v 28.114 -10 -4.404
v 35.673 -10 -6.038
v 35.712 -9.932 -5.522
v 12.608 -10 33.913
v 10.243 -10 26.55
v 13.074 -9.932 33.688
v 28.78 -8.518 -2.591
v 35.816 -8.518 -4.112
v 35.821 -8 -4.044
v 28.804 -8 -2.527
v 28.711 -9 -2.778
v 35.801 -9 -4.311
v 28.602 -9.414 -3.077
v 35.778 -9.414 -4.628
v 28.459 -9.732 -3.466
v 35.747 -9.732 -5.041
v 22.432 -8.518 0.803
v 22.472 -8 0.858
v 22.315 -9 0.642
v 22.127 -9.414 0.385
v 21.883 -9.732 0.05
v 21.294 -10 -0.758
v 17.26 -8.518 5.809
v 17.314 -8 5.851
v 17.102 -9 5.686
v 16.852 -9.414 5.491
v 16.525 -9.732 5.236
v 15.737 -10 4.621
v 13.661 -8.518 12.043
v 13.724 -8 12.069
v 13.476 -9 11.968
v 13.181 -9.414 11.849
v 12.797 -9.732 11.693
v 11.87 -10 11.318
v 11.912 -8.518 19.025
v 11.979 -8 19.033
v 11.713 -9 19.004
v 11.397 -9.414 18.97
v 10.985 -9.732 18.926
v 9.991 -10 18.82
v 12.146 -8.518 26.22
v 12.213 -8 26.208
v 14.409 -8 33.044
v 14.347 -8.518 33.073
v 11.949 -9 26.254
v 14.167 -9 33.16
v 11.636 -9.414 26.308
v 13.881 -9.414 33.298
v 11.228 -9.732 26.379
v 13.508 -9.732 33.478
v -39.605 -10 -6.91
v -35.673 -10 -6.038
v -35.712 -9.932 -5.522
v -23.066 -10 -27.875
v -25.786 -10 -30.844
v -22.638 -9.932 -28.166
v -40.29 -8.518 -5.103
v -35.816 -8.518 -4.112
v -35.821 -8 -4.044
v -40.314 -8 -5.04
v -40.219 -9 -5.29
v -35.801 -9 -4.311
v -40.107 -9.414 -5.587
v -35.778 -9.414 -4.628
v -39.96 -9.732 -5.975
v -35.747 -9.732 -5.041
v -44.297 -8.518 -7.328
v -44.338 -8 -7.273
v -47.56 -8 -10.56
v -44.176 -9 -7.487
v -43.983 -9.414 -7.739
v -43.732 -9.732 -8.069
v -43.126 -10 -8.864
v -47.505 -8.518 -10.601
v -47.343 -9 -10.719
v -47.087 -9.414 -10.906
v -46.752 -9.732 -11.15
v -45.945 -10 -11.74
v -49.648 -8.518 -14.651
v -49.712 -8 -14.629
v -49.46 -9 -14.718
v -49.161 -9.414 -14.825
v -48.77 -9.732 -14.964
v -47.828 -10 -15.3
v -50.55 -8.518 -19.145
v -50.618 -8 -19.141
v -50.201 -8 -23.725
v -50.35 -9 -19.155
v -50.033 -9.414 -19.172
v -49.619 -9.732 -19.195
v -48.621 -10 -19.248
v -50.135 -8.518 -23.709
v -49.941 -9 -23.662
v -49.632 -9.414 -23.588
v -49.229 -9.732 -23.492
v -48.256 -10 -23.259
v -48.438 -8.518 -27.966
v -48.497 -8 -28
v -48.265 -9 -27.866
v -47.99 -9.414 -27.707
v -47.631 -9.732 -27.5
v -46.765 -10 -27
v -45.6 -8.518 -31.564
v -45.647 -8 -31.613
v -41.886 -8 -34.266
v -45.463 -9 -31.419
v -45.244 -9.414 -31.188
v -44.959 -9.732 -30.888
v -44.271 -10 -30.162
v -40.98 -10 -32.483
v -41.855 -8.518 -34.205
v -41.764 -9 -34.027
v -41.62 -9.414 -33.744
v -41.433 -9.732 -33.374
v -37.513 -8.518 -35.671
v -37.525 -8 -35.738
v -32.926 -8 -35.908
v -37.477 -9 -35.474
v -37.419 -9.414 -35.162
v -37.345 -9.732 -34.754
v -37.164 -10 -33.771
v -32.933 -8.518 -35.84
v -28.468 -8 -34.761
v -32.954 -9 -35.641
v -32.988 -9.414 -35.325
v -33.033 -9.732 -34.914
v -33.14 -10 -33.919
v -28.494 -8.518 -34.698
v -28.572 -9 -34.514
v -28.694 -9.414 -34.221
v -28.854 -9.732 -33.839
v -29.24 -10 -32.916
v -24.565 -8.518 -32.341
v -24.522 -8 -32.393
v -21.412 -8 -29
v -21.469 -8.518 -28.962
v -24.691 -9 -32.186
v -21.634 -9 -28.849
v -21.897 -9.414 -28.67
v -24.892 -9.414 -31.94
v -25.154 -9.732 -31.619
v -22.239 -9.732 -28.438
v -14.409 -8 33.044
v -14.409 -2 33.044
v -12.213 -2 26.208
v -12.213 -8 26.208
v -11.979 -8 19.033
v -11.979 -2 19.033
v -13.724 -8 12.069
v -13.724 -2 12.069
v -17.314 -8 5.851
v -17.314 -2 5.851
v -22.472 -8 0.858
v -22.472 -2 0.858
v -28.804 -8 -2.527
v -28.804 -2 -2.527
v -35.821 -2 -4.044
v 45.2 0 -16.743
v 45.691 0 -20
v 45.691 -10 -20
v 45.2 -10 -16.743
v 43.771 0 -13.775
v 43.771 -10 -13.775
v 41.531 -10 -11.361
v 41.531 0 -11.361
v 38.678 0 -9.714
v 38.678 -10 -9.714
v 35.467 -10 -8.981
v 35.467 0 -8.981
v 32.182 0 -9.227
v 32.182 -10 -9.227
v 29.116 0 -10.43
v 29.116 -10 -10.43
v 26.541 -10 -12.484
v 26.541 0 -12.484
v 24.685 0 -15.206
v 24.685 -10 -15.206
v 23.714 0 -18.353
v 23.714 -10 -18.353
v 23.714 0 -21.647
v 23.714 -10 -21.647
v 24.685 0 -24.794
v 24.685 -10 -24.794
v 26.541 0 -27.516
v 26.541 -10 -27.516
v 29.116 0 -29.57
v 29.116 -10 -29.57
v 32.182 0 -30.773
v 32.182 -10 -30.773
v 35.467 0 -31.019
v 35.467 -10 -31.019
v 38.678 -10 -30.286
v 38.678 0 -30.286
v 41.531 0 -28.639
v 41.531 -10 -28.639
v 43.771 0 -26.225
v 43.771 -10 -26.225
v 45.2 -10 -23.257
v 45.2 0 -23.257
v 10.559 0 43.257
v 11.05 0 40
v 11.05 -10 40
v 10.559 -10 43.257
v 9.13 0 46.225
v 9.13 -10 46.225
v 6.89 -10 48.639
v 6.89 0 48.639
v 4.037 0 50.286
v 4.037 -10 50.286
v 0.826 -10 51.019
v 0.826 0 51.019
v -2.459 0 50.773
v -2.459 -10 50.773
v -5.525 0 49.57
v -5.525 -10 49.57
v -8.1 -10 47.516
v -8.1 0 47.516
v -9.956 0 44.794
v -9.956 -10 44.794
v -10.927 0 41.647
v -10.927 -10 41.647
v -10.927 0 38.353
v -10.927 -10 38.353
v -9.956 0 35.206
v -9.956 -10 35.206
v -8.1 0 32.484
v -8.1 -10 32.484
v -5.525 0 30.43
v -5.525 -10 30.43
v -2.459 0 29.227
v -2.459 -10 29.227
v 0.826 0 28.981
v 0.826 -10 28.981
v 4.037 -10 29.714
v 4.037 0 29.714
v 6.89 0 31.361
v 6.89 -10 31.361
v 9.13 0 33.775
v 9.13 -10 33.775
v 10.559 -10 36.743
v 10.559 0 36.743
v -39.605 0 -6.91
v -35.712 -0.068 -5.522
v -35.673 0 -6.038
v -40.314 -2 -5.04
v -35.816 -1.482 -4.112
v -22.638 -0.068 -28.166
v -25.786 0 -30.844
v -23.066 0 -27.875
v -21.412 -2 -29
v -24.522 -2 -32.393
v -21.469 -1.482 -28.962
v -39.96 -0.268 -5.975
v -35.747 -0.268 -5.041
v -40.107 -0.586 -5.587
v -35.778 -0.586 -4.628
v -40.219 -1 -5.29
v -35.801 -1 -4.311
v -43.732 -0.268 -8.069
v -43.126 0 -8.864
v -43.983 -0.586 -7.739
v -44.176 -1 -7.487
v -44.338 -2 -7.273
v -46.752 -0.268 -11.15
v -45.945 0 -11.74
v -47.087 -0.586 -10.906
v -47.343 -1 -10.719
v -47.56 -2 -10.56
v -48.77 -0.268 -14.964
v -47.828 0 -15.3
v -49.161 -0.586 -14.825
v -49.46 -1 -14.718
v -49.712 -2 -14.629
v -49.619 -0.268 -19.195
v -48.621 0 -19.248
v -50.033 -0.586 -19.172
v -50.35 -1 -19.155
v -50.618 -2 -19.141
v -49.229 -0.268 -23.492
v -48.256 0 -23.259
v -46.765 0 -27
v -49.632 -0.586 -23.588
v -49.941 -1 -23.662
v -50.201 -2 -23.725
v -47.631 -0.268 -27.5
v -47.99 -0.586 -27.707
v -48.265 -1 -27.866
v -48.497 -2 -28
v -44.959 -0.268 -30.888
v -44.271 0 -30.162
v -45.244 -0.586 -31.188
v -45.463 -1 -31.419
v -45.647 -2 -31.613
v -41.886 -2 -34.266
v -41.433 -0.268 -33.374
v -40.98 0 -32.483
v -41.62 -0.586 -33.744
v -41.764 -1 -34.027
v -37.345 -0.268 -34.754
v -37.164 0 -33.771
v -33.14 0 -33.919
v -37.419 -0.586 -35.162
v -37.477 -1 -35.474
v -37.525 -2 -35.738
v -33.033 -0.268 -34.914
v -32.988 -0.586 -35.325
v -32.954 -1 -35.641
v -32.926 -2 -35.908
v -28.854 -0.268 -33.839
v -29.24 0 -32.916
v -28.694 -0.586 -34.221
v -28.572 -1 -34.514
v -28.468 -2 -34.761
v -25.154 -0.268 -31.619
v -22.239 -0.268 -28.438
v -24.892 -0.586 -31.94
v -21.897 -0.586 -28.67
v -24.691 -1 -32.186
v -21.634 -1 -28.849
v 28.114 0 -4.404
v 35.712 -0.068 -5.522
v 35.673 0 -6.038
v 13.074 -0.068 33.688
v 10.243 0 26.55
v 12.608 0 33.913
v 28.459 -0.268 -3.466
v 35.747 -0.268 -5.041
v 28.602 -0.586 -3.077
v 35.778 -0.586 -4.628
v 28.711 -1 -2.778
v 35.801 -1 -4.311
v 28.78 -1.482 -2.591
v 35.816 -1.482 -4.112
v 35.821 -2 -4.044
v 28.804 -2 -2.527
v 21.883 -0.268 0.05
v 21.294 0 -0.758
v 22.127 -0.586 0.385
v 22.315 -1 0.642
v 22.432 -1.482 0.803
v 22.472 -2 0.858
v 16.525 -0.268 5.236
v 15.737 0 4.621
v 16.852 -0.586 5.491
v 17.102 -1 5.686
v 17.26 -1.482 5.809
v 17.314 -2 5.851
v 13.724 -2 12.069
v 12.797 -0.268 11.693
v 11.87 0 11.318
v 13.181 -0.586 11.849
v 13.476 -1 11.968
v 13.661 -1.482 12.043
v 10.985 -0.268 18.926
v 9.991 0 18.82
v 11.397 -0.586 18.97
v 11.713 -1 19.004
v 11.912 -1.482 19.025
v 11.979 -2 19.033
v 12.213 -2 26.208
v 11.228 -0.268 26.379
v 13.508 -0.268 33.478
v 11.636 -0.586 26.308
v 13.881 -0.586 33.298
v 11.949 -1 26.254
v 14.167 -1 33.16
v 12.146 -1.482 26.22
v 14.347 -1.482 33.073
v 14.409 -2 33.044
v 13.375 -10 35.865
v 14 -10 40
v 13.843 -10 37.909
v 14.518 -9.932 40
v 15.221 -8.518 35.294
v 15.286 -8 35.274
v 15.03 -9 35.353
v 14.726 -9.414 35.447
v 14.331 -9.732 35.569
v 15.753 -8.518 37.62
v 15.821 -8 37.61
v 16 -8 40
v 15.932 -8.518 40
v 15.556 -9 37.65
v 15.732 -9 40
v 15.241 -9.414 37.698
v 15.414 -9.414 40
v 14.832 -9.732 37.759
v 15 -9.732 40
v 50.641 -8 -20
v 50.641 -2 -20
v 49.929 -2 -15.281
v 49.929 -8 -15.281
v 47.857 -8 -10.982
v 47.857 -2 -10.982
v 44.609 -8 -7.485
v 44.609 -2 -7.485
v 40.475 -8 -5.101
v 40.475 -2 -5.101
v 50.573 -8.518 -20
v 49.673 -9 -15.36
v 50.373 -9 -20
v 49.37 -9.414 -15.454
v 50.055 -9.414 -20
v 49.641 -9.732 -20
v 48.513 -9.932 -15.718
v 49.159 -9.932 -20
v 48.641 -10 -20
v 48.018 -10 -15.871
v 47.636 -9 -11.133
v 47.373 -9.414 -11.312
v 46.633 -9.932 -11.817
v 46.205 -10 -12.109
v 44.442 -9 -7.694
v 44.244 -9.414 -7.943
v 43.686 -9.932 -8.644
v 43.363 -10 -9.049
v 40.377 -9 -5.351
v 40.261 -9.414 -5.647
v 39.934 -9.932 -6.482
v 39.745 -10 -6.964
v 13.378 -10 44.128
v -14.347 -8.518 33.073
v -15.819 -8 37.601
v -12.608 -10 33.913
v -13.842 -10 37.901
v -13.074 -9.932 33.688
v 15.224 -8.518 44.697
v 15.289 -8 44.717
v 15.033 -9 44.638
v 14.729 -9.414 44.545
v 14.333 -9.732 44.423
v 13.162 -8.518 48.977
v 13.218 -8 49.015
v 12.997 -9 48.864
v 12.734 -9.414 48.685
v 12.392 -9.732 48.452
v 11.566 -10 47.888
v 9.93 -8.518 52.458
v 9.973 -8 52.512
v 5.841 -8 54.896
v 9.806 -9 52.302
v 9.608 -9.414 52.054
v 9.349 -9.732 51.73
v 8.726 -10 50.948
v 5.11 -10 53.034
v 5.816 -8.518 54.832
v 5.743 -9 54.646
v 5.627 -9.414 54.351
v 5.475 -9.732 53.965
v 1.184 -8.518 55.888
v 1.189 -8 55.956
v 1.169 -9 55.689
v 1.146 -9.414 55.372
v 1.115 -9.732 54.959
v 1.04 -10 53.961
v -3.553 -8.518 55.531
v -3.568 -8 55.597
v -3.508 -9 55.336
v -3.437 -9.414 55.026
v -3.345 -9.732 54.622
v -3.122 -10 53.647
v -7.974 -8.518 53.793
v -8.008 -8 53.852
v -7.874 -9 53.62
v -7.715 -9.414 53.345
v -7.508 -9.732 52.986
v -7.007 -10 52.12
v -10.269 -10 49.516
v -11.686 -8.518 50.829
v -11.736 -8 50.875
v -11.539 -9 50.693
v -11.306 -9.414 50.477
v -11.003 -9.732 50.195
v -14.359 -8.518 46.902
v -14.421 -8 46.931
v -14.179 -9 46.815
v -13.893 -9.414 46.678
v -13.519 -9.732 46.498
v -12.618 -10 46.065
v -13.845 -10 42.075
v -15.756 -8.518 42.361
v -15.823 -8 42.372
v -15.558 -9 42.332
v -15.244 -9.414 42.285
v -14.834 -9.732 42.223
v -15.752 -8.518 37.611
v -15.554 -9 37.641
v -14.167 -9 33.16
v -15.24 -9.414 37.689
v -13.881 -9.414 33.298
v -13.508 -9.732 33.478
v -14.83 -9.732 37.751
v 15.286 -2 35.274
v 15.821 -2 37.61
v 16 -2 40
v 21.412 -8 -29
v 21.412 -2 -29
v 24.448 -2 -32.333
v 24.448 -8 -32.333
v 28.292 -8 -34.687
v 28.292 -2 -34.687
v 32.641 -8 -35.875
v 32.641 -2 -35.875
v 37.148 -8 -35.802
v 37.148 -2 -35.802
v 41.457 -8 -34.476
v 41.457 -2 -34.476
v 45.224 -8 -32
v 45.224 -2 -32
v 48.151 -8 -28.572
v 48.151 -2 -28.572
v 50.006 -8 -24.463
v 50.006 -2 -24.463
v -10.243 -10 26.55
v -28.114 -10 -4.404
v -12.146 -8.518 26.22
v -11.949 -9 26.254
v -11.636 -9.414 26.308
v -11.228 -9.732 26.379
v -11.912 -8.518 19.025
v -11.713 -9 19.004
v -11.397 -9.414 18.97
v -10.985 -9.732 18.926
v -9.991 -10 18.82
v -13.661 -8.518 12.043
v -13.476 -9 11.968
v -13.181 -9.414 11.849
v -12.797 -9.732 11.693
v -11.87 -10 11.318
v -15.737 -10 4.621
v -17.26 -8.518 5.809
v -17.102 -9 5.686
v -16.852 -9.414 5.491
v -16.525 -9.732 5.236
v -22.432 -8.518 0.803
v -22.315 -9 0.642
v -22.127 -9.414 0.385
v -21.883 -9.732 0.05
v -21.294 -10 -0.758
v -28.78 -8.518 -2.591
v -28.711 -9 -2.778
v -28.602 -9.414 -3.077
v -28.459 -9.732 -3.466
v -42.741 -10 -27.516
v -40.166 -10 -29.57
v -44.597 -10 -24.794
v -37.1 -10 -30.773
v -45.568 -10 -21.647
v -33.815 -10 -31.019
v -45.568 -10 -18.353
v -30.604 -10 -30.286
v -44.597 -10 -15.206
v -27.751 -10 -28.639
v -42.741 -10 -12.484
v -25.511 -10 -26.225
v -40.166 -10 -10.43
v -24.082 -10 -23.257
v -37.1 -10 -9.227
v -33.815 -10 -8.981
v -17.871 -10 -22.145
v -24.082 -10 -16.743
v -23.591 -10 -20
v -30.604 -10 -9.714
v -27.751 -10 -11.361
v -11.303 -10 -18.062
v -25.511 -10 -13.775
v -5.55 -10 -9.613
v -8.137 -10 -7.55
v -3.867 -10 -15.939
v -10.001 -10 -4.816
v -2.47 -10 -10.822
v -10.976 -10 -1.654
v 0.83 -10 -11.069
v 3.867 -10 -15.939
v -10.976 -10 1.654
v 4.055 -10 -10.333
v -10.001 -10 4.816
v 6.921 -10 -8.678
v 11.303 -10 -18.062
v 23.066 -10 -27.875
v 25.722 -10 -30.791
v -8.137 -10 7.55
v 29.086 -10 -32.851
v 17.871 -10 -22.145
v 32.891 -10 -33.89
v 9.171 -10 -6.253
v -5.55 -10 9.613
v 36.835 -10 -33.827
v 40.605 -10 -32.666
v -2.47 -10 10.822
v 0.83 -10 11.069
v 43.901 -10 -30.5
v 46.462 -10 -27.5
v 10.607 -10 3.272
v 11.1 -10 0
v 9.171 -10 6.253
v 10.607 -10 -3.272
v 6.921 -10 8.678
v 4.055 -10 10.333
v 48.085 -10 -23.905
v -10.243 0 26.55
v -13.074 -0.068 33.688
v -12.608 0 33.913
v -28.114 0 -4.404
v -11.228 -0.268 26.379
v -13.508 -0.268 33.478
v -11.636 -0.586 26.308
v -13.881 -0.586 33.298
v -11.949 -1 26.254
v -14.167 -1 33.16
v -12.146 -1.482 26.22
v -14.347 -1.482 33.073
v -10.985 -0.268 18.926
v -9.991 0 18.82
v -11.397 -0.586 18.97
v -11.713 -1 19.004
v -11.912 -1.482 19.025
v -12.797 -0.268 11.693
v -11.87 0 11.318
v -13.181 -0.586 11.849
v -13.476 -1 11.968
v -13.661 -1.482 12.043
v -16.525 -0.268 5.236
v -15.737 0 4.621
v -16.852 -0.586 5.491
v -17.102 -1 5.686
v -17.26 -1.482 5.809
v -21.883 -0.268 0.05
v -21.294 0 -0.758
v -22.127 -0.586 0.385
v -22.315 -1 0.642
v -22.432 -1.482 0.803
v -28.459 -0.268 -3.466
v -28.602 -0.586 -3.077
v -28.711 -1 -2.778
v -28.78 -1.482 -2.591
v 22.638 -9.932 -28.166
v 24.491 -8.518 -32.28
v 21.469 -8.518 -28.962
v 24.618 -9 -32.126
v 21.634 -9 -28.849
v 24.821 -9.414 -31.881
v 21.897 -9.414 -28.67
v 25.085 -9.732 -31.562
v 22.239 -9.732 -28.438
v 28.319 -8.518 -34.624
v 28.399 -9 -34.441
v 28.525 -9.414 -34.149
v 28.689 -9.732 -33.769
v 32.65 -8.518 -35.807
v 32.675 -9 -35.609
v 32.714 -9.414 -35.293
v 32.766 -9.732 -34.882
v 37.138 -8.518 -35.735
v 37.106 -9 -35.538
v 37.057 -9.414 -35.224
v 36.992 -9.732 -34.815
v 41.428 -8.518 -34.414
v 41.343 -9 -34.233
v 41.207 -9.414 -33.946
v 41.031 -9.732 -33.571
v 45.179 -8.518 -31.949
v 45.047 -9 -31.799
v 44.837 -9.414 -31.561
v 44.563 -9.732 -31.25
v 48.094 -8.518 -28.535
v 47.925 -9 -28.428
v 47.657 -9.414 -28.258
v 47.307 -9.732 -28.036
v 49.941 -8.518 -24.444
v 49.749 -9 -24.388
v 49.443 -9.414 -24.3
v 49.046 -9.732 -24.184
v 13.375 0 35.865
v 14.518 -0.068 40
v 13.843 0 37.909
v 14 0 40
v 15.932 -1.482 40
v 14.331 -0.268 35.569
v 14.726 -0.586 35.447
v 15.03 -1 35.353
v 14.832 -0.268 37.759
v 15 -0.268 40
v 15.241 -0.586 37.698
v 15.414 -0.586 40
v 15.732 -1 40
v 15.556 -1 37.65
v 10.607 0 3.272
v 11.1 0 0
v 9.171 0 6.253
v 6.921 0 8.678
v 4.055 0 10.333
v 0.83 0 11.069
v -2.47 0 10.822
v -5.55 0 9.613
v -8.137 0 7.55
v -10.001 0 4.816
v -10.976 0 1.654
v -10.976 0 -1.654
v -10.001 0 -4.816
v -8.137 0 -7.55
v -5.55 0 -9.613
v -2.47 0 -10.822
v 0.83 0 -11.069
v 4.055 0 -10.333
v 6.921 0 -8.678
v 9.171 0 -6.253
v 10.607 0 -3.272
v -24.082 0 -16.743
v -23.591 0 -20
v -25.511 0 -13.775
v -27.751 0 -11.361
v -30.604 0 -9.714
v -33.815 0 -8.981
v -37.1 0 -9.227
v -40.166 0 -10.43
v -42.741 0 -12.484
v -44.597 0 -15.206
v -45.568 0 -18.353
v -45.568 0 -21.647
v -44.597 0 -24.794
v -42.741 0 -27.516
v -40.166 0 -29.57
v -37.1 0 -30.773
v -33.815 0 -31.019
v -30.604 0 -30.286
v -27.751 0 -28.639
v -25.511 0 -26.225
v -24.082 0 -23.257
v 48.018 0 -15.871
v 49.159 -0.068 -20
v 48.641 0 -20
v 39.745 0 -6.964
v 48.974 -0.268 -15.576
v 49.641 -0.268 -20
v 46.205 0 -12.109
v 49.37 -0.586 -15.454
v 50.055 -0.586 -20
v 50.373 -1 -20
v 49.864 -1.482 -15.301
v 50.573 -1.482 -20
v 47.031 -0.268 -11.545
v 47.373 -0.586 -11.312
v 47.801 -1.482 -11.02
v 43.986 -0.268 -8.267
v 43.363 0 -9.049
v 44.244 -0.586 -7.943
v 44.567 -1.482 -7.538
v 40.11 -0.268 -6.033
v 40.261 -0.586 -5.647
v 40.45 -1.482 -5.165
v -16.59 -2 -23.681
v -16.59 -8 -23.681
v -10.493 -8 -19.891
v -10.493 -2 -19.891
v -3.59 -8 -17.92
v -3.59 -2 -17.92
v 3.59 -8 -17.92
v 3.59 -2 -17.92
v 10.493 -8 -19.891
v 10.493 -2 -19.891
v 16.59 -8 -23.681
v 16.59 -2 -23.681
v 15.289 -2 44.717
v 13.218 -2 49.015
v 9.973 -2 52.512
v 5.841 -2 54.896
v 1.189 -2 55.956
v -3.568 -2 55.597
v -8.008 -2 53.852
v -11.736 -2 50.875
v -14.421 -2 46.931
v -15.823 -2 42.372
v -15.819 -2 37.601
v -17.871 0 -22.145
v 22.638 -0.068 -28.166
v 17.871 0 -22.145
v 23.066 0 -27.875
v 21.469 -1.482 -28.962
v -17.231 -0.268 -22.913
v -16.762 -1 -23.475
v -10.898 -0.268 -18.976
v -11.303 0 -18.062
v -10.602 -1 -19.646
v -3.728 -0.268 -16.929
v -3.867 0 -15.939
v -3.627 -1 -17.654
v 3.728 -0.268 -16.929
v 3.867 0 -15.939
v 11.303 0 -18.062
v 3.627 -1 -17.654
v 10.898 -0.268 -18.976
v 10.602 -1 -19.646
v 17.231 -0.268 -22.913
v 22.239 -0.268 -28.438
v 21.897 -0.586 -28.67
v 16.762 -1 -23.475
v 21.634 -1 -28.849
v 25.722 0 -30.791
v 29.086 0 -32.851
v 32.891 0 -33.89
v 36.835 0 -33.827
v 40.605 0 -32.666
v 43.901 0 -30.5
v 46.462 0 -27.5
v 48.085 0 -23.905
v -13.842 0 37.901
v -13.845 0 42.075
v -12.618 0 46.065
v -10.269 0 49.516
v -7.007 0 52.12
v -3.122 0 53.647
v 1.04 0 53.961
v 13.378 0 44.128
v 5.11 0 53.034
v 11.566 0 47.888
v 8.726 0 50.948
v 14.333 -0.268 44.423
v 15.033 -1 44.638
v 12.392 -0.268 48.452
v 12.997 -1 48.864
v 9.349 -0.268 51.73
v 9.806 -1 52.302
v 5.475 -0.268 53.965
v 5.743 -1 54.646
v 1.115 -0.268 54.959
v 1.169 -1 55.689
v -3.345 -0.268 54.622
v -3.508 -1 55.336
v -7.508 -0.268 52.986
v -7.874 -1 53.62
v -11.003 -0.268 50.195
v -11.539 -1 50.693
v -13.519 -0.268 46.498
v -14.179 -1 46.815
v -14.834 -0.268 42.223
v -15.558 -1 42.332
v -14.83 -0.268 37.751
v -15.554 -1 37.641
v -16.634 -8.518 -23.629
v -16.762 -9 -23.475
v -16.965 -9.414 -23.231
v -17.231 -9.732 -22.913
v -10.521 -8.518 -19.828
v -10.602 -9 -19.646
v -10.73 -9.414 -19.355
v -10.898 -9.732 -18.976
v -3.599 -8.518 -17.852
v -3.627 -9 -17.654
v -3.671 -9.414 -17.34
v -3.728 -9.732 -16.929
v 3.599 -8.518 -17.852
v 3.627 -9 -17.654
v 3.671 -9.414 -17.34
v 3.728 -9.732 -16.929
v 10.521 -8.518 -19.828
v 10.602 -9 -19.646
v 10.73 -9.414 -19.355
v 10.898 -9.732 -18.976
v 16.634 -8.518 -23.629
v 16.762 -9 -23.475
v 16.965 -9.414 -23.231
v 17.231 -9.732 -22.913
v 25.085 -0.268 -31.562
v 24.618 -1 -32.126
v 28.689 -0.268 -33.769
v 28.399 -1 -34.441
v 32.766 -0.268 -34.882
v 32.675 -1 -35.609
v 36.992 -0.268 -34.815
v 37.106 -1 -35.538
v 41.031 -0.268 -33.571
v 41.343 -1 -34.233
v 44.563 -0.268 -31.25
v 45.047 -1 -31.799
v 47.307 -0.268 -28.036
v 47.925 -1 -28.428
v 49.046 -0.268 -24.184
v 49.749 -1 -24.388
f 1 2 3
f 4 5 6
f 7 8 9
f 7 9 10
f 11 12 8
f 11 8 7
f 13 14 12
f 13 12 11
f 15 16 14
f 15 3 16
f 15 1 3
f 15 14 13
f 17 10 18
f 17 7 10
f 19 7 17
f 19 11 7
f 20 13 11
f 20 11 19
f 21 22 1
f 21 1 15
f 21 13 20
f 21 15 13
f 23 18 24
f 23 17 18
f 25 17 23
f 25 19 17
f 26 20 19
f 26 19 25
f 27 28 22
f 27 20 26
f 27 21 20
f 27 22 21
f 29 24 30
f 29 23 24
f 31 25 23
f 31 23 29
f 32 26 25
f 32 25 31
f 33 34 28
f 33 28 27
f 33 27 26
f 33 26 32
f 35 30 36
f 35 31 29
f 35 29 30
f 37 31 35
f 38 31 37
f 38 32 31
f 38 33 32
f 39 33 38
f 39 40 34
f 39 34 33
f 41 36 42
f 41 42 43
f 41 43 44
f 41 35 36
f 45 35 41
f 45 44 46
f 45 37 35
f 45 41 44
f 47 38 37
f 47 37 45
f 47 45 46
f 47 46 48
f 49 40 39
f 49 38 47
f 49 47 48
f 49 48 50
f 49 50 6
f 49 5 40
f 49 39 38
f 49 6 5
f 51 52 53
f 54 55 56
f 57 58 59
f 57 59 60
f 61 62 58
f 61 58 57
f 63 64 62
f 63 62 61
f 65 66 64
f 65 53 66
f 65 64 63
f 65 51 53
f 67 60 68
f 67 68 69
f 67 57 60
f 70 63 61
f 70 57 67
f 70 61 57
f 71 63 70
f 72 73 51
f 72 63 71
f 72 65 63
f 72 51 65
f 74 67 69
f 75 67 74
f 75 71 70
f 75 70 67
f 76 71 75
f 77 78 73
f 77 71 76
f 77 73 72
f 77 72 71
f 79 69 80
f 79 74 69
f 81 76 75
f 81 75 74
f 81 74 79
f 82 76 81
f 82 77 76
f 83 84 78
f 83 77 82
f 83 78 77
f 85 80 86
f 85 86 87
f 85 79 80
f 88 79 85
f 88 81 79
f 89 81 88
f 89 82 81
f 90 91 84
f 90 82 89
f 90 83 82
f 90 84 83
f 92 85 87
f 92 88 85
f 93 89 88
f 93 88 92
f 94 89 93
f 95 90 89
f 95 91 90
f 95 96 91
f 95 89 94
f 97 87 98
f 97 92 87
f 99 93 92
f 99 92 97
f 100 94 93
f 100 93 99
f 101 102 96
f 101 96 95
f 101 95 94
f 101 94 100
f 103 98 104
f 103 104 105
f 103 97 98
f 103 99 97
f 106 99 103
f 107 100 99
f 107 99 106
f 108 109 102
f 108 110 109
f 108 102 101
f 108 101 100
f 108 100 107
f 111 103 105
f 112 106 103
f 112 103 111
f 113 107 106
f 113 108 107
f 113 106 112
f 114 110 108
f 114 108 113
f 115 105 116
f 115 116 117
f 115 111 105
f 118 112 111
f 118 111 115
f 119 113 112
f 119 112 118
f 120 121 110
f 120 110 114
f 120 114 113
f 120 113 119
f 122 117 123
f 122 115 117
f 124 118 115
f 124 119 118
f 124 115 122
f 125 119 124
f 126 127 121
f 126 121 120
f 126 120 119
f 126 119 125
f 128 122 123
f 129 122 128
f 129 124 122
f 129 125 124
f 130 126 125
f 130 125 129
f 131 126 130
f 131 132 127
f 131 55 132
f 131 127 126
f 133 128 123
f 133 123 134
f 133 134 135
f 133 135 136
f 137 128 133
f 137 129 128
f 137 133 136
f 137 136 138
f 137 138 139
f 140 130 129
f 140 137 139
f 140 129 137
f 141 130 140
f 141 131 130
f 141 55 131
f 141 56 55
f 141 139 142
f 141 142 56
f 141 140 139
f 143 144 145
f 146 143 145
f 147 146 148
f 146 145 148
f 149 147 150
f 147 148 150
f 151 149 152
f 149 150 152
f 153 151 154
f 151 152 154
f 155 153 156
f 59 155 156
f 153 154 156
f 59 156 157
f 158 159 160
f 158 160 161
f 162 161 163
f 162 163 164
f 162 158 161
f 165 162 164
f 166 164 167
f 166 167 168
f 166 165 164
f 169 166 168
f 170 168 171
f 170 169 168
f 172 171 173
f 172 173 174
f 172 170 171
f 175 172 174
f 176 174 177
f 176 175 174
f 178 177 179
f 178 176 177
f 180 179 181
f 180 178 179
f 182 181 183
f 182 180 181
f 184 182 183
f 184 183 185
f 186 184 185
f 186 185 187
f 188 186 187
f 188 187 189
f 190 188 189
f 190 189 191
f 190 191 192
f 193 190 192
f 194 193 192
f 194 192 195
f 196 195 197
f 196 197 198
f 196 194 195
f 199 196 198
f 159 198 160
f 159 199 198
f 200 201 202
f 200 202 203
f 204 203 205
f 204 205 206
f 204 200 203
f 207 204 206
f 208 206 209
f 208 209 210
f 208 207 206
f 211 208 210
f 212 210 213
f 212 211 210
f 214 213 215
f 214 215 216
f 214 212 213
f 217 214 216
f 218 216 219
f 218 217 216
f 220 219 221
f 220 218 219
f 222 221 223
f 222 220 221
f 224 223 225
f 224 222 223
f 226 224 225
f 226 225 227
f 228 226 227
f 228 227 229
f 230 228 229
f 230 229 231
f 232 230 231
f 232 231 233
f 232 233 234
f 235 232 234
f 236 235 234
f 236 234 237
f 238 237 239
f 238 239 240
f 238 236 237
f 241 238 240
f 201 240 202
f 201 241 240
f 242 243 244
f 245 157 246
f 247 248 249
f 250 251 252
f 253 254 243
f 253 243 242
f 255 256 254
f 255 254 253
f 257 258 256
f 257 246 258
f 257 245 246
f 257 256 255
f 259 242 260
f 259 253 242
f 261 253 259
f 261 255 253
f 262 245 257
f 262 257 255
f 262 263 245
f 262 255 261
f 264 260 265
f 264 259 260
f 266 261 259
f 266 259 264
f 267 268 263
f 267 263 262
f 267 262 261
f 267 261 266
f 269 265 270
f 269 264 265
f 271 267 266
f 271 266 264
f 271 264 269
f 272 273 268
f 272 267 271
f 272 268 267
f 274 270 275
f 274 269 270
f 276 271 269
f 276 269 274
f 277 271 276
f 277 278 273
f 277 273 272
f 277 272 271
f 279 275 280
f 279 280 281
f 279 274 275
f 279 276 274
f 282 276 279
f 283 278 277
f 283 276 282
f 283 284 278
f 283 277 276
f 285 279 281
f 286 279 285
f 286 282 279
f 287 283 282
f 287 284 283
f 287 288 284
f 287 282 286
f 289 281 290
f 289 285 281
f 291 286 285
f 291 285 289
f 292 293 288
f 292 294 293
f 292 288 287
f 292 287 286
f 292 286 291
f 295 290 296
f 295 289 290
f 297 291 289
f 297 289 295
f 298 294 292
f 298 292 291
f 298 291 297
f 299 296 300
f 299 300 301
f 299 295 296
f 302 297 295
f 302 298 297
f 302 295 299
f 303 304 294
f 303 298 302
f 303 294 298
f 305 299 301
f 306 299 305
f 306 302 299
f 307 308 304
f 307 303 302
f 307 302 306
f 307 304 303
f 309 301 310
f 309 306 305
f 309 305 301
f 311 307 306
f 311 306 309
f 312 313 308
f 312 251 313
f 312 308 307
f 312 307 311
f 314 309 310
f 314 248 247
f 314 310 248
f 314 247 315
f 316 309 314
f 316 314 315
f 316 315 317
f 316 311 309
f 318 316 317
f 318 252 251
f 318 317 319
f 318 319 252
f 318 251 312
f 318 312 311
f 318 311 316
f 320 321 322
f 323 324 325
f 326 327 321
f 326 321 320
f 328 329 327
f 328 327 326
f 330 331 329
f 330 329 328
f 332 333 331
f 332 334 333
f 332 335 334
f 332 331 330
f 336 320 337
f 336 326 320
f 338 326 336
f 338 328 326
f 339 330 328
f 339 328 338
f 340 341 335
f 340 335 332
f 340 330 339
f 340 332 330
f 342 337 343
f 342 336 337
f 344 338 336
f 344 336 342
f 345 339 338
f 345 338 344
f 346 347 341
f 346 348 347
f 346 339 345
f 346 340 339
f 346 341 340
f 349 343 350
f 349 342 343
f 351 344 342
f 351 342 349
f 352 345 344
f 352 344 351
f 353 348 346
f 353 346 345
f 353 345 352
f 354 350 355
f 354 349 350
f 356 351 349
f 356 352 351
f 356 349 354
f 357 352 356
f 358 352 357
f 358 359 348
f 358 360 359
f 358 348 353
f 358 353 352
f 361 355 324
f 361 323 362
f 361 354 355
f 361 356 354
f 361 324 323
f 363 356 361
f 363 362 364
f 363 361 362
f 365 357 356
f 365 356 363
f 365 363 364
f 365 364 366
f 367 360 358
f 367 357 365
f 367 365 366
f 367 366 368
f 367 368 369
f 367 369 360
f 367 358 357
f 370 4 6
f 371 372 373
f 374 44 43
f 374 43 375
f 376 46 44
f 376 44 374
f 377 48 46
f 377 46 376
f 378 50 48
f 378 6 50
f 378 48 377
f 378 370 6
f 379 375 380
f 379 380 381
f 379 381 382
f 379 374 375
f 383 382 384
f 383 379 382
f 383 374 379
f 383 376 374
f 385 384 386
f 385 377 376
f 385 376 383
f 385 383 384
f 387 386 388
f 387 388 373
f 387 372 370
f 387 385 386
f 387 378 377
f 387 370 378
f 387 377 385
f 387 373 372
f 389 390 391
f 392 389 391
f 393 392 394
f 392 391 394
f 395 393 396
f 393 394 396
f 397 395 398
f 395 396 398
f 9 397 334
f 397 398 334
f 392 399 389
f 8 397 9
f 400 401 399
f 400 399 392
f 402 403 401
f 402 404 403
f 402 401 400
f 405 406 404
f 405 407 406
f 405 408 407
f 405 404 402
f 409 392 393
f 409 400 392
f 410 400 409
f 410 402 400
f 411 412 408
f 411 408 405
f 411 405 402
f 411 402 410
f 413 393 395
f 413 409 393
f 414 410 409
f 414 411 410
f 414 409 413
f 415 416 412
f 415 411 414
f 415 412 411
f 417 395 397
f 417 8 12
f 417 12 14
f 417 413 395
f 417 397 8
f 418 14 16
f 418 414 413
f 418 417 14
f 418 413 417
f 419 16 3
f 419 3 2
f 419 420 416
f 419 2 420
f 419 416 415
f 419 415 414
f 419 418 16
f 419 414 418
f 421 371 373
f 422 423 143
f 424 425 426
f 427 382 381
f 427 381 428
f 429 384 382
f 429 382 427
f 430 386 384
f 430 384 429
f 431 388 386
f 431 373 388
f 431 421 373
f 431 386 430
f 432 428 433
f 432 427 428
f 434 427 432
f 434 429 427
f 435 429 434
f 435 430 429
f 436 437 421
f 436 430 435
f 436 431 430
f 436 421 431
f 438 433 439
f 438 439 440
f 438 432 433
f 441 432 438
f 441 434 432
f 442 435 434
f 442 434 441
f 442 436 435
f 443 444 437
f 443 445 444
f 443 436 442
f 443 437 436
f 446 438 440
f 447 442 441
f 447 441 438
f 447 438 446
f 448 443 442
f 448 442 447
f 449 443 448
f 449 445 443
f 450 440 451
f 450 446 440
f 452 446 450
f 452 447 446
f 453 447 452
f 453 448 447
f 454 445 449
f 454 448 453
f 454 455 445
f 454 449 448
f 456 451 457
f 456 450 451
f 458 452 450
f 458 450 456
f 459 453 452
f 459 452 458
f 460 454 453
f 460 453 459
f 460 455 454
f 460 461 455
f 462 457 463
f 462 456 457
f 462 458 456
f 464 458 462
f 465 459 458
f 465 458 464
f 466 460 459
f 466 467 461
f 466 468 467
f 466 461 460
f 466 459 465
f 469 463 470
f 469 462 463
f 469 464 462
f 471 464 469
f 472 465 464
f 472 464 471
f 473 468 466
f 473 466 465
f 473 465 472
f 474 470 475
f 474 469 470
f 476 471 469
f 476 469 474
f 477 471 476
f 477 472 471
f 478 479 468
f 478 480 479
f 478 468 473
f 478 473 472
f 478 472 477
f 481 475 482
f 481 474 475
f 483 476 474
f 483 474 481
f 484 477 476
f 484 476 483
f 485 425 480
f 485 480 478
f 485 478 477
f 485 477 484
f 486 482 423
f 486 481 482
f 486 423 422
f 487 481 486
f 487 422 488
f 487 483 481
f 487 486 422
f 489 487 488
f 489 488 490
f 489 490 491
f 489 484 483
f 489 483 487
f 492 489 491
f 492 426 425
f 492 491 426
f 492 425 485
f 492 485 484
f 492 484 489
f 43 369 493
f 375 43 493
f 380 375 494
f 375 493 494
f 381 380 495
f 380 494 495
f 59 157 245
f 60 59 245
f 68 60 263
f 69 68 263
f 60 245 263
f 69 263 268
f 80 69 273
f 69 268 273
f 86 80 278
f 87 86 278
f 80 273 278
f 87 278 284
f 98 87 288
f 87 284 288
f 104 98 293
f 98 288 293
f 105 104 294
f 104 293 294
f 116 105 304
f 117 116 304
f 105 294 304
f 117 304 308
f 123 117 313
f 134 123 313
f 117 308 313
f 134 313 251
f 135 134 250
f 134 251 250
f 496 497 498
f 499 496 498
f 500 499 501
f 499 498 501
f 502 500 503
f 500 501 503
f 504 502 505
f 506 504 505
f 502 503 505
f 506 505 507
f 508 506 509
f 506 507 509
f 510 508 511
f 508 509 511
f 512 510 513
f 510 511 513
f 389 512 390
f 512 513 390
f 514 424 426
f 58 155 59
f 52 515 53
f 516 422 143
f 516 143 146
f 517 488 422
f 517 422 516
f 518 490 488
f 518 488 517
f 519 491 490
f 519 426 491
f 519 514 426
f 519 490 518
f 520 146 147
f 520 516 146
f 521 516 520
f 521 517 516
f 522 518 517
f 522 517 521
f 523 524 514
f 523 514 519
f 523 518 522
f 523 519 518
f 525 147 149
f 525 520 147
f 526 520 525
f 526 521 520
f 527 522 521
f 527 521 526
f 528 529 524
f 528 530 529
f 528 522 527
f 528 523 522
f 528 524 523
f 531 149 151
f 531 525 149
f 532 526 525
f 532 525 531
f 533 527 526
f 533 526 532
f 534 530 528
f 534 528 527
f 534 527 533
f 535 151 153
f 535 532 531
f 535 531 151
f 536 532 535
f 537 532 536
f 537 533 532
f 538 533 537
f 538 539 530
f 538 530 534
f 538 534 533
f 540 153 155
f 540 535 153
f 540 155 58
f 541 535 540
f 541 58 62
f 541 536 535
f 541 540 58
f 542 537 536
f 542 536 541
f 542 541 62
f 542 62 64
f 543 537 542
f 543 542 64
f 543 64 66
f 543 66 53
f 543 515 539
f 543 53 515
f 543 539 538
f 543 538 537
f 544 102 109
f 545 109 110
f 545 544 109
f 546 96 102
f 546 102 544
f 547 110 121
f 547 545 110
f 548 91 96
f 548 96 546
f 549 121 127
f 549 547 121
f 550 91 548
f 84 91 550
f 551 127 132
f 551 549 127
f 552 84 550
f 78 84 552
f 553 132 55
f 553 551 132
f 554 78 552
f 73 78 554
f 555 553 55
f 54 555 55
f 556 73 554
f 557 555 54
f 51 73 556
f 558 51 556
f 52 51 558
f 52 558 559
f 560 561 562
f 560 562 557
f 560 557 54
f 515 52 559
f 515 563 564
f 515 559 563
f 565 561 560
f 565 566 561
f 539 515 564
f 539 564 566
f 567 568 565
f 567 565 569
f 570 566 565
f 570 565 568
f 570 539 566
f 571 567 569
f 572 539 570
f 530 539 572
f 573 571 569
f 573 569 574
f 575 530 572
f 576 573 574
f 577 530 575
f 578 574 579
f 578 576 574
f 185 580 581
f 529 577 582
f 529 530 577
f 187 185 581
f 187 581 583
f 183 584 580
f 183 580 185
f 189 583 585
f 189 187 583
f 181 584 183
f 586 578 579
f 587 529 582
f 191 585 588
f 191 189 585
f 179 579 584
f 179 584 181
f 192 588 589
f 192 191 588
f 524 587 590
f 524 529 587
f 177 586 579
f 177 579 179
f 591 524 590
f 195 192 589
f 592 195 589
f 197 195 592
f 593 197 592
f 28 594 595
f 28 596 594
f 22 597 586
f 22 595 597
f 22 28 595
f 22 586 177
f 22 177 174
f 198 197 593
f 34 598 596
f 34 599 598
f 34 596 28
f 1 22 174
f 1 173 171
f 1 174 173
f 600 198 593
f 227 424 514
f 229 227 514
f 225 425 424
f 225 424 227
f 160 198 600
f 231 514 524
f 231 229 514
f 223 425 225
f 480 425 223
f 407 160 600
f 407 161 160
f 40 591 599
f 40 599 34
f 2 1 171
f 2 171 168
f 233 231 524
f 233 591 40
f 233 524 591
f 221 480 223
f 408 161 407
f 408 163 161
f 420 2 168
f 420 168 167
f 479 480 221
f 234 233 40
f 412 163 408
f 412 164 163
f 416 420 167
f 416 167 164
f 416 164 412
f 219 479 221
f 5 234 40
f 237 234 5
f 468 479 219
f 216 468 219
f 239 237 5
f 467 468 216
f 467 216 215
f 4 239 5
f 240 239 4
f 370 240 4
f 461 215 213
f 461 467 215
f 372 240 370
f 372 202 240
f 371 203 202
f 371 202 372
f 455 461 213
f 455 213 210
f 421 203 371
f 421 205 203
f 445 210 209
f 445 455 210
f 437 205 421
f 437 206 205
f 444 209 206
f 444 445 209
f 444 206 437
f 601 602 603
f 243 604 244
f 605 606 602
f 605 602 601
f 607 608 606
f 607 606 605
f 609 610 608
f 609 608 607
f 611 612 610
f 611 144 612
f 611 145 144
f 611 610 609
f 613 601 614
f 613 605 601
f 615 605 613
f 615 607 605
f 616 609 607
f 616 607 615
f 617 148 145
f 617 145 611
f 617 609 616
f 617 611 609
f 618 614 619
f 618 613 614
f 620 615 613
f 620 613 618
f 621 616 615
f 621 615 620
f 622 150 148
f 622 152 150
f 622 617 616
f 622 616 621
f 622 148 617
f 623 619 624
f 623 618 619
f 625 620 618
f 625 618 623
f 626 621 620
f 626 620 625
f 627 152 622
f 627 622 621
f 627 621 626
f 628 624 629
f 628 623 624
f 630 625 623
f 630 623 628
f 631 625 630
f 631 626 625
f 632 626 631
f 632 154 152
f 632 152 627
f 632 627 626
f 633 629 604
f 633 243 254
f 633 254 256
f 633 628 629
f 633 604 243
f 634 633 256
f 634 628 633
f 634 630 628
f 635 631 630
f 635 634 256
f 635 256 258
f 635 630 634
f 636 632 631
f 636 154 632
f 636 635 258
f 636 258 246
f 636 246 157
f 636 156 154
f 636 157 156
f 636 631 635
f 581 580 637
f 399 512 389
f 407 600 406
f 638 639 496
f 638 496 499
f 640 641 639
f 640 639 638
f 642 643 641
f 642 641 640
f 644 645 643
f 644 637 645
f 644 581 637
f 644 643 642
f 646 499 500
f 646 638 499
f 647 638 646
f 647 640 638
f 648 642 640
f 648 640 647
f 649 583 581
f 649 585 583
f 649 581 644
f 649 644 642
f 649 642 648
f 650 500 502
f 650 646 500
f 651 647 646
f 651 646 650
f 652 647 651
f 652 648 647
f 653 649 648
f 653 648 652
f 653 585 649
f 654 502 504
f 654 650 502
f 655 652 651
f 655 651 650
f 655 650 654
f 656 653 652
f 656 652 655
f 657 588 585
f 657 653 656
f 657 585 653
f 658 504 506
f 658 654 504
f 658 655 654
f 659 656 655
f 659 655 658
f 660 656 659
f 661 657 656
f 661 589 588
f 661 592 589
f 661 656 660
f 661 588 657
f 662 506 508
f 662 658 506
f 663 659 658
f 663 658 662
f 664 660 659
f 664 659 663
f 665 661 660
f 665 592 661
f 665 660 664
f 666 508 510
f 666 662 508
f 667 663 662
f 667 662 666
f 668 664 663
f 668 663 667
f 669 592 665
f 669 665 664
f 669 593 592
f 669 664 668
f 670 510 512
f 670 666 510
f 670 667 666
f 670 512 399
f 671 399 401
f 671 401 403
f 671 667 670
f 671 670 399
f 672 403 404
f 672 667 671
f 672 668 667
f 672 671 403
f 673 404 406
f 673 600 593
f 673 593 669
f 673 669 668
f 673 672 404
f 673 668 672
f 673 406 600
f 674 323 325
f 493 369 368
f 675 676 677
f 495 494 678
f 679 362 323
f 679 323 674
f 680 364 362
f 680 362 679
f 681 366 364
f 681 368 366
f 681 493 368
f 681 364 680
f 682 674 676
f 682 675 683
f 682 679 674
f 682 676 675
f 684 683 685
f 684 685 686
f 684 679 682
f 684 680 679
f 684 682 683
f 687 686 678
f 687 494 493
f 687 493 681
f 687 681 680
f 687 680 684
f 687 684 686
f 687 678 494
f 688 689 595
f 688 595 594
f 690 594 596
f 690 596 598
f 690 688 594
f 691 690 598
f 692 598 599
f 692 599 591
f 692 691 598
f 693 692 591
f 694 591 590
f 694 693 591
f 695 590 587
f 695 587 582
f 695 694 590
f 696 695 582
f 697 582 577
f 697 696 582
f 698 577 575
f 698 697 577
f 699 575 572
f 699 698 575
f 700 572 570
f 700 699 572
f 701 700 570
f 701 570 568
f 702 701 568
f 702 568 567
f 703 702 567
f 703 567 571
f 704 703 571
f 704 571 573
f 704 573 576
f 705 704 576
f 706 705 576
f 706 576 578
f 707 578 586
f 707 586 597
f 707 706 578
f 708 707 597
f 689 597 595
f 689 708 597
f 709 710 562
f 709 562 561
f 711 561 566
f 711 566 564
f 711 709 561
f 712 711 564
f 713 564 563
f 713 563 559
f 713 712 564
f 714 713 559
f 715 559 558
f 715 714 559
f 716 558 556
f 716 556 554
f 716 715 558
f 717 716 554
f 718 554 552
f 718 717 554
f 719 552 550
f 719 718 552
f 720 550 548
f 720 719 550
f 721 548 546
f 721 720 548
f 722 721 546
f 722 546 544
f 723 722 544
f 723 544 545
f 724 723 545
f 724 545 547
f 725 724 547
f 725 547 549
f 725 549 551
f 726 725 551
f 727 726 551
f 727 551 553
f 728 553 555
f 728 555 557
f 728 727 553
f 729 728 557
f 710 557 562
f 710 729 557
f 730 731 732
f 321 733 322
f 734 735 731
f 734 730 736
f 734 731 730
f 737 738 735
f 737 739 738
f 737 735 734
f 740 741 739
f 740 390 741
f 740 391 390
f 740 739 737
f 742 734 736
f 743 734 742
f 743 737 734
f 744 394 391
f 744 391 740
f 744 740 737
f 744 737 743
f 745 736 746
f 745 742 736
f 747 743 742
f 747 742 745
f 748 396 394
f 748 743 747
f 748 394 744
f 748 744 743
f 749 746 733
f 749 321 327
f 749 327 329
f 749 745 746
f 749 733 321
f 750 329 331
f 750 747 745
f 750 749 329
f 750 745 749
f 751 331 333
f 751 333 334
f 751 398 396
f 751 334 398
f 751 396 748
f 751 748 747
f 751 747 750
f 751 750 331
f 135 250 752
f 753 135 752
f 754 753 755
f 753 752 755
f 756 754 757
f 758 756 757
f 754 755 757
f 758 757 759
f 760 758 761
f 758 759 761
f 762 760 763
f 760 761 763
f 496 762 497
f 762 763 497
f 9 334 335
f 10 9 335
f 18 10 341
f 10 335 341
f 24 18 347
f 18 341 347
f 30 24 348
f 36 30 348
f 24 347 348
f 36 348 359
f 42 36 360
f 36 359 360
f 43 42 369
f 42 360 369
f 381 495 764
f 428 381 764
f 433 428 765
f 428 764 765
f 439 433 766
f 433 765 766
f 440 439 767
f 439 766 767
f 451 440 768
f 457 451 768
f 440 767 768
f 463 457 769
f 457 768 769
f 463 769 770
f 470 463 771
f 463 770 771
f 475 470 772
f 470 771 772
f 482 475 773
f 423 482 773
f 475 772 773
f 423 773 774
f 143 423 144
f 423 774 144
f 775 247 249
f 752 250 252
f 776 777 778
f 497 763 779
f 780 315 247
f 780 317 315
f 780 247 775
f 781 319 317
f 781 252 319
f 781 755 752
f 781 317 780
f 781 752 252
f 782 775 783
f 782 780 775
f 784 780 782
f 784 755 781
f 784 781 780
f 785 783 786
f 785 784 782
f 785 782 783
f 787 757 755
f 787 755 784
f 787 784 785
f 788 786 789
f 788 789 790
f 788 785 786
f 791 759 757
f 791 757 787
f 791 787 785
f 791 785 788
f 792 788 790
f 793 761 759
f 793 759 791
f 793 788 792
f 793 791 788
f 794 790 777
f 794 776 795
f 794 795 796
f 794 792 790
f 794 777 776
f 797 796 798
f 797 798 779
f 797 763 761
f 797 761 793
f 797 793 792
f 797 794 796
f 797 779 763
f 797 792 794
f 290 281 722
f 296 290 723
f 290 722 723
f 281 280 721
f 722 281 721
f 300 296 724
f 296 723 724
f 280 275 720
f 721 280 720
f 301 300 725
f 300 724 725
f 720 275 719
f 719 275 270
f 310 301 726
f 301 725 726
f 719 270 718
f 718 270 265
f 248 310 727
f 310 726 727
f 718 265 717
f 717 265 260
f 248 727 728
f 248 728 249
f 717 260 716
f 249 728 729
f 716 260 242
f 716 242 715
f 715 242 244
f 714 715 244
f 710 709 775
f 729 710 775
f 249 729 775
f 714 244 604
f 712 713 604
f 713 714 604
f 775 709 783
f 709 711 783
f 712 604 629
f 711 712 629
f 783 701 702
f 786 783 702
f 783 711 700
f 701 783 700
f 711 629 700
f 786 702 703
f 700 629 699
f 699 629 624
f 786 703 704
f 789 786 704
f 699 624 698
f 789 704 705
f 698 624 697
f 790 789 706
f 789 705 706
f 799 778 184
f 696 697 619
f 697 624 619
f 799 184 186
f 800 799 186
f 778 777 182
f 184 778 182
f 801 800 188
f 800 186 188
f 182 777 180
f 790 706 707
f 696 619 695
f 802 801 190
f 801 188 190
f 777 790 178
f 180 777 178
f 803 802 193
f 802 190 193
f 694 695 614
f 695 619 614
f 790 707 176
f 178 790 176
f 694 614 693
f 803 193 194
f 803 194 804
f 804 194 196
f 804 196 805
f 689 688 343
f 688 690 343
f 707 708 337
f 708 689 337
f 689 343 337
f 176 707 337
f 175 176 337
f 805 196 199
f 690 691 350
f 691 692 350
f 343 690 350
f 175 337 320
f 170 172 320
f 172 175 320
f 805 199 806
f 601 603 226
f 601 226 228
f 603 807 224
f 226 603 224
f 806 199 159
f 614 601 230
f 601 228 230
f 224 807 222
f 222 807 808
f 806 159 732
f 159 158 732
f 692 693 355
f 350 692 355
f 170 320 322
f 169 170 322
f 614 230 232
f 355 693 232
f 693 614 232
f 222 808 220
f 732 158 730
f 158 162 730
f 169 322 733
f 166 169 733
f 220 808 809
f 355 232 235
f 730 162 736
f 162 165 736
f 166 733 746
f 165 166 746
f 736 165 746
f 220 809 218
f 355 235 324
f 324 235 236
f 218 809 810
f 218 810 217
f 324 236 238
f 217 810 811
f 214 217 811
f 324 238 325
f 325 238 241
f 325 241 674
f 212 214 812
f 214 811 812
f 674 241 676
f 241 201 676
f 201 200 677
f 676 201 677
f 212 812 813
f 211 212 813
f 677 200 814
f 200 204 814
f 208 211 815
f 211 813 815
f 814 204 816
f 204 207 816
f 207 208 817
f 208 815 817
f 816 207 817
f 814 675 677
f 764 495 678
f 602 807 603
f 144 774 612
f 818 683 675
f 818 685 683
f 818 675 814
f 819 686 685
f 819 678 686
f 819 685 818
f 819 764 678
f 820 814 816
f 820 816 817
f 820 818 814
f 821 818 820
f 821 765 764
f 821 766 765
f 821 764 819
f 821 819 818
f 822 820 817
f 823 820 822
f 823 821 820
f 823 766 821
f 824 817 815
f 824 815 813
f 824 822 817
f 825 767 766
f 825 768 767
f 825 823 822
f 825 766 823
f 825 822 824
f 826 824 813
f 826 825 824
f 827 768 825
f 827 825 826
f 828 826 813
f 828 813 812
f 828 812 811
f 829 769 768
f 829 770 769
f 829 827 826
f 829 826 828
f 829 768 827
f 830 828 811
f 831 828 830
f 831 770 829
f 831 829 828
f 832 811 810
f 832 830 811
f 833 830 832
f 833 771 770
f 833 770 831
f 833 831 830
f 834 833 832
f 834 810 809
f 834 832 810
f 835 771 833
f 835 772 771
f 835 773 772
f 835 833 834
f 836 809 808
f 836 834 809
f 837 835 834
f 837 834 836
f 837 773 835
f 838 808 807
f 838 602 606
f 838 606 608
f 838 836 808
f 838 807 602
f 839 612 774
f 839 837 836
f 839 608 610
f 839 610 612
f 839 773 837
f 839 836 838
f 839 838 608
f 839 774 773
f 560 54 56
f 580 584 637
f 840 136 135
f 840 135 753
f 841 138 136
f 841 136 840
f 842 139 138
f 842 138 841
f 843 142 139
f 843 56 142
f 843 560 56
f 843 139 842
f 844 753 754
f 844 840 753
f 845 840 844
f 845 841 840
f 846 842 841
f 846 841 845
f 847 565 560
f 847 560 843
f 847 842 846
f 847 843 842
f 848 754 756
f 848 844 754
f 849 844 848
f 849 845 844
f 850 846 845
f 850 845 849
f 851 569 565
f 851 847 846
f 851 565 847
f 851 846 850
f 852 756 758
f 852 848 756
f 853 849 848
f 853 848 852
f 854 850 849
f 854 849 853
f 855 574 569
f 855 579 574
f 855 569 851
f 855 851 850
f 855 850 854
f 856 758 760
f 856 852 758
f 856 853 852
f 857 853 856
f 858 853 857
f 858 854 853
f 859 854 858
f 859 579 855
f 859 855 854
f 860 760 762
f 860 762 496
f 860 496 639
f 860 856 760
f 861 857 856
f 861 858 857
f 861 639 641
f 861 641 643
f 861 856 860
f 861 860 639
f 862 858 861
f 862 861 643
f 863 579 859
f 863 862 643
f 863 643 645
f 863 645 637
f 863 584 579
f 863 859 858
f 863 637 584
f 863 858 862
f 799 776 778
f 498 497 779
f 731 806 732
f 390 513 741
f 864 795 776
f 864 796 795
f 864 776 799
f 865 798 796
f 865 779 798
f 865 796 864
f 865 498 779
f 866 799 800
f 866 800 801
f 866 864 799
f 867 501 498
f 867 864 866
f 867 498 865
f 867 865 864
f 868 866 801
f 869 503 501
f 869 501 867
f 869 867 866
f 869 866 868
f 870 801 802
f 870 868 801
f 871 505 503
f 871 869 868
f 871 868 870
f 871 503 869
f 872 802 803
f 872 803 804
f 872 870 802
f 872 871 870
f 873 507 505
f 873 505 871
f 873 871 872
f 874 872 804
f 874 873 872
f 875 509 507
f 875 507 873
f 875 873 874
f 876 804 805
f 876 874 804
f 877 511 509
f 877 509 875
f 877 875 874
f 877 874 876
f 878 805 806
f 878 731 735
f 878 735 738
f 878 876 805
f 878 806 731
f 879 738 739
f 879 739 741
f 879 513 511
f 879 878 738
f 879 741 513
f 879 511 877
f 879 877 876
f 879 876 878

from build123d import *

# Parameters (mm, degrees)
F0_R     = 11.05
F0_R_2   = 11.1
F1_DEPTH = 10
F2_R     = 2
F3_R     = 2


with BuildPart() as f1:
    # F0 (on Front) → F1 (new body)
    with BuildSketch(Plane.XZ):
        with BuildLine():
            ThreePointArc((14.408607, 33.043561), (15.597078, 36.431927), (16, 40))
            ThreePointArc((16, 40), (-3.568073, 55.597078), (-14.408607, 33.043561))
            ThreePointArc((-14.408607, 33.043561), (0, 24), (14.408607, 33.043561))
        make_face()
        with Locations((0, 40)):
            Circle(F0_R, mode=Mode.SUBTRACT)
        with BuildLine():
            ThreePointArc((14.408607, 33.043561), (0, 24), (-14.408607, 33.043561))
            ThreePointArc((-14.408607, 33.043561), (-15.302407, 8.834849), (-35.820867, -4.043561))
            ThreePointArc((-35.820867, -4.043561), (-23.752435, -8.27657), (-18.641016, -20))
            ThreePointArc((-18.641016, -20), (-19.349514, -24.708497), (-21.41226, -29))
            ThreePointArc((-21.41226, -29), (0, -17.669697), (21.41226, -29))
            ThreePointArc((21.41226, -29), (20.78461, -12), (35.820867, -4.043561))
            ThreePointArc((35.820867, -4.043561), (15.302407, 8.834849), (14.408607, 33.043561))
        make_face()
        Circle(F0_R_2, mode=Mode.SUBTRACT)
        with BuildLine():
            ThreePointArc((-18.641016, -20), (-23.752435, -8.27657), (-35.820867, -4.043561))
            ThreePointArc((-35.820867, -4.043561), (-48.497423, -28), (-21.41226, -29))
            ThreePointArc((-21.41226, -29), (-19.349514, -24.708497), (-18.641016, -20))
        make_face()
        with Locations((-34.641016, -20)):
            Circle(F0_R, mode=Mode.SUBTRACT)
        with BuildLine():
            ThreePointArc((50.641016, -20), (46.364446, -9.111419), (35.820867, -4.043561))
            ThreePointArc((35.820867, -4.043561), (20.78461, -12), (21.41226, -29))
            ThreePointArc((21.41226, -29), (39.349514, -35.291503), (50.641016, -20))
        make_face()
        with Locations((34.641016, -20)):
            Circle(F0_R, mode=Mode.SUBTRACT)
    extrude(amount=F1_DEPTH)

    # F2
    f2_edges = [f1.edges().sort_by_distance(p)[0] for p in [
        (-15.302407, -10, 8.834849),
        (-48.497423, -10, -28),
        (0, -10, -17.669697),
        (48.497423, -10, -28),
        (15.302407, -10, 8.834849),
        (0, -10, 56),
    ]]
    fillet(f2_edges, radius=F2_R)

    # F3
    f3_edges = [f1.edges().sort_by_distance(p)[0] for p in [
        (48.497423, 0, -28),
        (0, 0, -17.669697),
        (-48.497423, 0, -28),
        (-15.302407, 0, 8.834849),
        (0, 0, 56),
        (15.302407, 0, 8.834849),
    ]]
    fillet(f3_edges, radius=F3_R)


solid = f1.part
